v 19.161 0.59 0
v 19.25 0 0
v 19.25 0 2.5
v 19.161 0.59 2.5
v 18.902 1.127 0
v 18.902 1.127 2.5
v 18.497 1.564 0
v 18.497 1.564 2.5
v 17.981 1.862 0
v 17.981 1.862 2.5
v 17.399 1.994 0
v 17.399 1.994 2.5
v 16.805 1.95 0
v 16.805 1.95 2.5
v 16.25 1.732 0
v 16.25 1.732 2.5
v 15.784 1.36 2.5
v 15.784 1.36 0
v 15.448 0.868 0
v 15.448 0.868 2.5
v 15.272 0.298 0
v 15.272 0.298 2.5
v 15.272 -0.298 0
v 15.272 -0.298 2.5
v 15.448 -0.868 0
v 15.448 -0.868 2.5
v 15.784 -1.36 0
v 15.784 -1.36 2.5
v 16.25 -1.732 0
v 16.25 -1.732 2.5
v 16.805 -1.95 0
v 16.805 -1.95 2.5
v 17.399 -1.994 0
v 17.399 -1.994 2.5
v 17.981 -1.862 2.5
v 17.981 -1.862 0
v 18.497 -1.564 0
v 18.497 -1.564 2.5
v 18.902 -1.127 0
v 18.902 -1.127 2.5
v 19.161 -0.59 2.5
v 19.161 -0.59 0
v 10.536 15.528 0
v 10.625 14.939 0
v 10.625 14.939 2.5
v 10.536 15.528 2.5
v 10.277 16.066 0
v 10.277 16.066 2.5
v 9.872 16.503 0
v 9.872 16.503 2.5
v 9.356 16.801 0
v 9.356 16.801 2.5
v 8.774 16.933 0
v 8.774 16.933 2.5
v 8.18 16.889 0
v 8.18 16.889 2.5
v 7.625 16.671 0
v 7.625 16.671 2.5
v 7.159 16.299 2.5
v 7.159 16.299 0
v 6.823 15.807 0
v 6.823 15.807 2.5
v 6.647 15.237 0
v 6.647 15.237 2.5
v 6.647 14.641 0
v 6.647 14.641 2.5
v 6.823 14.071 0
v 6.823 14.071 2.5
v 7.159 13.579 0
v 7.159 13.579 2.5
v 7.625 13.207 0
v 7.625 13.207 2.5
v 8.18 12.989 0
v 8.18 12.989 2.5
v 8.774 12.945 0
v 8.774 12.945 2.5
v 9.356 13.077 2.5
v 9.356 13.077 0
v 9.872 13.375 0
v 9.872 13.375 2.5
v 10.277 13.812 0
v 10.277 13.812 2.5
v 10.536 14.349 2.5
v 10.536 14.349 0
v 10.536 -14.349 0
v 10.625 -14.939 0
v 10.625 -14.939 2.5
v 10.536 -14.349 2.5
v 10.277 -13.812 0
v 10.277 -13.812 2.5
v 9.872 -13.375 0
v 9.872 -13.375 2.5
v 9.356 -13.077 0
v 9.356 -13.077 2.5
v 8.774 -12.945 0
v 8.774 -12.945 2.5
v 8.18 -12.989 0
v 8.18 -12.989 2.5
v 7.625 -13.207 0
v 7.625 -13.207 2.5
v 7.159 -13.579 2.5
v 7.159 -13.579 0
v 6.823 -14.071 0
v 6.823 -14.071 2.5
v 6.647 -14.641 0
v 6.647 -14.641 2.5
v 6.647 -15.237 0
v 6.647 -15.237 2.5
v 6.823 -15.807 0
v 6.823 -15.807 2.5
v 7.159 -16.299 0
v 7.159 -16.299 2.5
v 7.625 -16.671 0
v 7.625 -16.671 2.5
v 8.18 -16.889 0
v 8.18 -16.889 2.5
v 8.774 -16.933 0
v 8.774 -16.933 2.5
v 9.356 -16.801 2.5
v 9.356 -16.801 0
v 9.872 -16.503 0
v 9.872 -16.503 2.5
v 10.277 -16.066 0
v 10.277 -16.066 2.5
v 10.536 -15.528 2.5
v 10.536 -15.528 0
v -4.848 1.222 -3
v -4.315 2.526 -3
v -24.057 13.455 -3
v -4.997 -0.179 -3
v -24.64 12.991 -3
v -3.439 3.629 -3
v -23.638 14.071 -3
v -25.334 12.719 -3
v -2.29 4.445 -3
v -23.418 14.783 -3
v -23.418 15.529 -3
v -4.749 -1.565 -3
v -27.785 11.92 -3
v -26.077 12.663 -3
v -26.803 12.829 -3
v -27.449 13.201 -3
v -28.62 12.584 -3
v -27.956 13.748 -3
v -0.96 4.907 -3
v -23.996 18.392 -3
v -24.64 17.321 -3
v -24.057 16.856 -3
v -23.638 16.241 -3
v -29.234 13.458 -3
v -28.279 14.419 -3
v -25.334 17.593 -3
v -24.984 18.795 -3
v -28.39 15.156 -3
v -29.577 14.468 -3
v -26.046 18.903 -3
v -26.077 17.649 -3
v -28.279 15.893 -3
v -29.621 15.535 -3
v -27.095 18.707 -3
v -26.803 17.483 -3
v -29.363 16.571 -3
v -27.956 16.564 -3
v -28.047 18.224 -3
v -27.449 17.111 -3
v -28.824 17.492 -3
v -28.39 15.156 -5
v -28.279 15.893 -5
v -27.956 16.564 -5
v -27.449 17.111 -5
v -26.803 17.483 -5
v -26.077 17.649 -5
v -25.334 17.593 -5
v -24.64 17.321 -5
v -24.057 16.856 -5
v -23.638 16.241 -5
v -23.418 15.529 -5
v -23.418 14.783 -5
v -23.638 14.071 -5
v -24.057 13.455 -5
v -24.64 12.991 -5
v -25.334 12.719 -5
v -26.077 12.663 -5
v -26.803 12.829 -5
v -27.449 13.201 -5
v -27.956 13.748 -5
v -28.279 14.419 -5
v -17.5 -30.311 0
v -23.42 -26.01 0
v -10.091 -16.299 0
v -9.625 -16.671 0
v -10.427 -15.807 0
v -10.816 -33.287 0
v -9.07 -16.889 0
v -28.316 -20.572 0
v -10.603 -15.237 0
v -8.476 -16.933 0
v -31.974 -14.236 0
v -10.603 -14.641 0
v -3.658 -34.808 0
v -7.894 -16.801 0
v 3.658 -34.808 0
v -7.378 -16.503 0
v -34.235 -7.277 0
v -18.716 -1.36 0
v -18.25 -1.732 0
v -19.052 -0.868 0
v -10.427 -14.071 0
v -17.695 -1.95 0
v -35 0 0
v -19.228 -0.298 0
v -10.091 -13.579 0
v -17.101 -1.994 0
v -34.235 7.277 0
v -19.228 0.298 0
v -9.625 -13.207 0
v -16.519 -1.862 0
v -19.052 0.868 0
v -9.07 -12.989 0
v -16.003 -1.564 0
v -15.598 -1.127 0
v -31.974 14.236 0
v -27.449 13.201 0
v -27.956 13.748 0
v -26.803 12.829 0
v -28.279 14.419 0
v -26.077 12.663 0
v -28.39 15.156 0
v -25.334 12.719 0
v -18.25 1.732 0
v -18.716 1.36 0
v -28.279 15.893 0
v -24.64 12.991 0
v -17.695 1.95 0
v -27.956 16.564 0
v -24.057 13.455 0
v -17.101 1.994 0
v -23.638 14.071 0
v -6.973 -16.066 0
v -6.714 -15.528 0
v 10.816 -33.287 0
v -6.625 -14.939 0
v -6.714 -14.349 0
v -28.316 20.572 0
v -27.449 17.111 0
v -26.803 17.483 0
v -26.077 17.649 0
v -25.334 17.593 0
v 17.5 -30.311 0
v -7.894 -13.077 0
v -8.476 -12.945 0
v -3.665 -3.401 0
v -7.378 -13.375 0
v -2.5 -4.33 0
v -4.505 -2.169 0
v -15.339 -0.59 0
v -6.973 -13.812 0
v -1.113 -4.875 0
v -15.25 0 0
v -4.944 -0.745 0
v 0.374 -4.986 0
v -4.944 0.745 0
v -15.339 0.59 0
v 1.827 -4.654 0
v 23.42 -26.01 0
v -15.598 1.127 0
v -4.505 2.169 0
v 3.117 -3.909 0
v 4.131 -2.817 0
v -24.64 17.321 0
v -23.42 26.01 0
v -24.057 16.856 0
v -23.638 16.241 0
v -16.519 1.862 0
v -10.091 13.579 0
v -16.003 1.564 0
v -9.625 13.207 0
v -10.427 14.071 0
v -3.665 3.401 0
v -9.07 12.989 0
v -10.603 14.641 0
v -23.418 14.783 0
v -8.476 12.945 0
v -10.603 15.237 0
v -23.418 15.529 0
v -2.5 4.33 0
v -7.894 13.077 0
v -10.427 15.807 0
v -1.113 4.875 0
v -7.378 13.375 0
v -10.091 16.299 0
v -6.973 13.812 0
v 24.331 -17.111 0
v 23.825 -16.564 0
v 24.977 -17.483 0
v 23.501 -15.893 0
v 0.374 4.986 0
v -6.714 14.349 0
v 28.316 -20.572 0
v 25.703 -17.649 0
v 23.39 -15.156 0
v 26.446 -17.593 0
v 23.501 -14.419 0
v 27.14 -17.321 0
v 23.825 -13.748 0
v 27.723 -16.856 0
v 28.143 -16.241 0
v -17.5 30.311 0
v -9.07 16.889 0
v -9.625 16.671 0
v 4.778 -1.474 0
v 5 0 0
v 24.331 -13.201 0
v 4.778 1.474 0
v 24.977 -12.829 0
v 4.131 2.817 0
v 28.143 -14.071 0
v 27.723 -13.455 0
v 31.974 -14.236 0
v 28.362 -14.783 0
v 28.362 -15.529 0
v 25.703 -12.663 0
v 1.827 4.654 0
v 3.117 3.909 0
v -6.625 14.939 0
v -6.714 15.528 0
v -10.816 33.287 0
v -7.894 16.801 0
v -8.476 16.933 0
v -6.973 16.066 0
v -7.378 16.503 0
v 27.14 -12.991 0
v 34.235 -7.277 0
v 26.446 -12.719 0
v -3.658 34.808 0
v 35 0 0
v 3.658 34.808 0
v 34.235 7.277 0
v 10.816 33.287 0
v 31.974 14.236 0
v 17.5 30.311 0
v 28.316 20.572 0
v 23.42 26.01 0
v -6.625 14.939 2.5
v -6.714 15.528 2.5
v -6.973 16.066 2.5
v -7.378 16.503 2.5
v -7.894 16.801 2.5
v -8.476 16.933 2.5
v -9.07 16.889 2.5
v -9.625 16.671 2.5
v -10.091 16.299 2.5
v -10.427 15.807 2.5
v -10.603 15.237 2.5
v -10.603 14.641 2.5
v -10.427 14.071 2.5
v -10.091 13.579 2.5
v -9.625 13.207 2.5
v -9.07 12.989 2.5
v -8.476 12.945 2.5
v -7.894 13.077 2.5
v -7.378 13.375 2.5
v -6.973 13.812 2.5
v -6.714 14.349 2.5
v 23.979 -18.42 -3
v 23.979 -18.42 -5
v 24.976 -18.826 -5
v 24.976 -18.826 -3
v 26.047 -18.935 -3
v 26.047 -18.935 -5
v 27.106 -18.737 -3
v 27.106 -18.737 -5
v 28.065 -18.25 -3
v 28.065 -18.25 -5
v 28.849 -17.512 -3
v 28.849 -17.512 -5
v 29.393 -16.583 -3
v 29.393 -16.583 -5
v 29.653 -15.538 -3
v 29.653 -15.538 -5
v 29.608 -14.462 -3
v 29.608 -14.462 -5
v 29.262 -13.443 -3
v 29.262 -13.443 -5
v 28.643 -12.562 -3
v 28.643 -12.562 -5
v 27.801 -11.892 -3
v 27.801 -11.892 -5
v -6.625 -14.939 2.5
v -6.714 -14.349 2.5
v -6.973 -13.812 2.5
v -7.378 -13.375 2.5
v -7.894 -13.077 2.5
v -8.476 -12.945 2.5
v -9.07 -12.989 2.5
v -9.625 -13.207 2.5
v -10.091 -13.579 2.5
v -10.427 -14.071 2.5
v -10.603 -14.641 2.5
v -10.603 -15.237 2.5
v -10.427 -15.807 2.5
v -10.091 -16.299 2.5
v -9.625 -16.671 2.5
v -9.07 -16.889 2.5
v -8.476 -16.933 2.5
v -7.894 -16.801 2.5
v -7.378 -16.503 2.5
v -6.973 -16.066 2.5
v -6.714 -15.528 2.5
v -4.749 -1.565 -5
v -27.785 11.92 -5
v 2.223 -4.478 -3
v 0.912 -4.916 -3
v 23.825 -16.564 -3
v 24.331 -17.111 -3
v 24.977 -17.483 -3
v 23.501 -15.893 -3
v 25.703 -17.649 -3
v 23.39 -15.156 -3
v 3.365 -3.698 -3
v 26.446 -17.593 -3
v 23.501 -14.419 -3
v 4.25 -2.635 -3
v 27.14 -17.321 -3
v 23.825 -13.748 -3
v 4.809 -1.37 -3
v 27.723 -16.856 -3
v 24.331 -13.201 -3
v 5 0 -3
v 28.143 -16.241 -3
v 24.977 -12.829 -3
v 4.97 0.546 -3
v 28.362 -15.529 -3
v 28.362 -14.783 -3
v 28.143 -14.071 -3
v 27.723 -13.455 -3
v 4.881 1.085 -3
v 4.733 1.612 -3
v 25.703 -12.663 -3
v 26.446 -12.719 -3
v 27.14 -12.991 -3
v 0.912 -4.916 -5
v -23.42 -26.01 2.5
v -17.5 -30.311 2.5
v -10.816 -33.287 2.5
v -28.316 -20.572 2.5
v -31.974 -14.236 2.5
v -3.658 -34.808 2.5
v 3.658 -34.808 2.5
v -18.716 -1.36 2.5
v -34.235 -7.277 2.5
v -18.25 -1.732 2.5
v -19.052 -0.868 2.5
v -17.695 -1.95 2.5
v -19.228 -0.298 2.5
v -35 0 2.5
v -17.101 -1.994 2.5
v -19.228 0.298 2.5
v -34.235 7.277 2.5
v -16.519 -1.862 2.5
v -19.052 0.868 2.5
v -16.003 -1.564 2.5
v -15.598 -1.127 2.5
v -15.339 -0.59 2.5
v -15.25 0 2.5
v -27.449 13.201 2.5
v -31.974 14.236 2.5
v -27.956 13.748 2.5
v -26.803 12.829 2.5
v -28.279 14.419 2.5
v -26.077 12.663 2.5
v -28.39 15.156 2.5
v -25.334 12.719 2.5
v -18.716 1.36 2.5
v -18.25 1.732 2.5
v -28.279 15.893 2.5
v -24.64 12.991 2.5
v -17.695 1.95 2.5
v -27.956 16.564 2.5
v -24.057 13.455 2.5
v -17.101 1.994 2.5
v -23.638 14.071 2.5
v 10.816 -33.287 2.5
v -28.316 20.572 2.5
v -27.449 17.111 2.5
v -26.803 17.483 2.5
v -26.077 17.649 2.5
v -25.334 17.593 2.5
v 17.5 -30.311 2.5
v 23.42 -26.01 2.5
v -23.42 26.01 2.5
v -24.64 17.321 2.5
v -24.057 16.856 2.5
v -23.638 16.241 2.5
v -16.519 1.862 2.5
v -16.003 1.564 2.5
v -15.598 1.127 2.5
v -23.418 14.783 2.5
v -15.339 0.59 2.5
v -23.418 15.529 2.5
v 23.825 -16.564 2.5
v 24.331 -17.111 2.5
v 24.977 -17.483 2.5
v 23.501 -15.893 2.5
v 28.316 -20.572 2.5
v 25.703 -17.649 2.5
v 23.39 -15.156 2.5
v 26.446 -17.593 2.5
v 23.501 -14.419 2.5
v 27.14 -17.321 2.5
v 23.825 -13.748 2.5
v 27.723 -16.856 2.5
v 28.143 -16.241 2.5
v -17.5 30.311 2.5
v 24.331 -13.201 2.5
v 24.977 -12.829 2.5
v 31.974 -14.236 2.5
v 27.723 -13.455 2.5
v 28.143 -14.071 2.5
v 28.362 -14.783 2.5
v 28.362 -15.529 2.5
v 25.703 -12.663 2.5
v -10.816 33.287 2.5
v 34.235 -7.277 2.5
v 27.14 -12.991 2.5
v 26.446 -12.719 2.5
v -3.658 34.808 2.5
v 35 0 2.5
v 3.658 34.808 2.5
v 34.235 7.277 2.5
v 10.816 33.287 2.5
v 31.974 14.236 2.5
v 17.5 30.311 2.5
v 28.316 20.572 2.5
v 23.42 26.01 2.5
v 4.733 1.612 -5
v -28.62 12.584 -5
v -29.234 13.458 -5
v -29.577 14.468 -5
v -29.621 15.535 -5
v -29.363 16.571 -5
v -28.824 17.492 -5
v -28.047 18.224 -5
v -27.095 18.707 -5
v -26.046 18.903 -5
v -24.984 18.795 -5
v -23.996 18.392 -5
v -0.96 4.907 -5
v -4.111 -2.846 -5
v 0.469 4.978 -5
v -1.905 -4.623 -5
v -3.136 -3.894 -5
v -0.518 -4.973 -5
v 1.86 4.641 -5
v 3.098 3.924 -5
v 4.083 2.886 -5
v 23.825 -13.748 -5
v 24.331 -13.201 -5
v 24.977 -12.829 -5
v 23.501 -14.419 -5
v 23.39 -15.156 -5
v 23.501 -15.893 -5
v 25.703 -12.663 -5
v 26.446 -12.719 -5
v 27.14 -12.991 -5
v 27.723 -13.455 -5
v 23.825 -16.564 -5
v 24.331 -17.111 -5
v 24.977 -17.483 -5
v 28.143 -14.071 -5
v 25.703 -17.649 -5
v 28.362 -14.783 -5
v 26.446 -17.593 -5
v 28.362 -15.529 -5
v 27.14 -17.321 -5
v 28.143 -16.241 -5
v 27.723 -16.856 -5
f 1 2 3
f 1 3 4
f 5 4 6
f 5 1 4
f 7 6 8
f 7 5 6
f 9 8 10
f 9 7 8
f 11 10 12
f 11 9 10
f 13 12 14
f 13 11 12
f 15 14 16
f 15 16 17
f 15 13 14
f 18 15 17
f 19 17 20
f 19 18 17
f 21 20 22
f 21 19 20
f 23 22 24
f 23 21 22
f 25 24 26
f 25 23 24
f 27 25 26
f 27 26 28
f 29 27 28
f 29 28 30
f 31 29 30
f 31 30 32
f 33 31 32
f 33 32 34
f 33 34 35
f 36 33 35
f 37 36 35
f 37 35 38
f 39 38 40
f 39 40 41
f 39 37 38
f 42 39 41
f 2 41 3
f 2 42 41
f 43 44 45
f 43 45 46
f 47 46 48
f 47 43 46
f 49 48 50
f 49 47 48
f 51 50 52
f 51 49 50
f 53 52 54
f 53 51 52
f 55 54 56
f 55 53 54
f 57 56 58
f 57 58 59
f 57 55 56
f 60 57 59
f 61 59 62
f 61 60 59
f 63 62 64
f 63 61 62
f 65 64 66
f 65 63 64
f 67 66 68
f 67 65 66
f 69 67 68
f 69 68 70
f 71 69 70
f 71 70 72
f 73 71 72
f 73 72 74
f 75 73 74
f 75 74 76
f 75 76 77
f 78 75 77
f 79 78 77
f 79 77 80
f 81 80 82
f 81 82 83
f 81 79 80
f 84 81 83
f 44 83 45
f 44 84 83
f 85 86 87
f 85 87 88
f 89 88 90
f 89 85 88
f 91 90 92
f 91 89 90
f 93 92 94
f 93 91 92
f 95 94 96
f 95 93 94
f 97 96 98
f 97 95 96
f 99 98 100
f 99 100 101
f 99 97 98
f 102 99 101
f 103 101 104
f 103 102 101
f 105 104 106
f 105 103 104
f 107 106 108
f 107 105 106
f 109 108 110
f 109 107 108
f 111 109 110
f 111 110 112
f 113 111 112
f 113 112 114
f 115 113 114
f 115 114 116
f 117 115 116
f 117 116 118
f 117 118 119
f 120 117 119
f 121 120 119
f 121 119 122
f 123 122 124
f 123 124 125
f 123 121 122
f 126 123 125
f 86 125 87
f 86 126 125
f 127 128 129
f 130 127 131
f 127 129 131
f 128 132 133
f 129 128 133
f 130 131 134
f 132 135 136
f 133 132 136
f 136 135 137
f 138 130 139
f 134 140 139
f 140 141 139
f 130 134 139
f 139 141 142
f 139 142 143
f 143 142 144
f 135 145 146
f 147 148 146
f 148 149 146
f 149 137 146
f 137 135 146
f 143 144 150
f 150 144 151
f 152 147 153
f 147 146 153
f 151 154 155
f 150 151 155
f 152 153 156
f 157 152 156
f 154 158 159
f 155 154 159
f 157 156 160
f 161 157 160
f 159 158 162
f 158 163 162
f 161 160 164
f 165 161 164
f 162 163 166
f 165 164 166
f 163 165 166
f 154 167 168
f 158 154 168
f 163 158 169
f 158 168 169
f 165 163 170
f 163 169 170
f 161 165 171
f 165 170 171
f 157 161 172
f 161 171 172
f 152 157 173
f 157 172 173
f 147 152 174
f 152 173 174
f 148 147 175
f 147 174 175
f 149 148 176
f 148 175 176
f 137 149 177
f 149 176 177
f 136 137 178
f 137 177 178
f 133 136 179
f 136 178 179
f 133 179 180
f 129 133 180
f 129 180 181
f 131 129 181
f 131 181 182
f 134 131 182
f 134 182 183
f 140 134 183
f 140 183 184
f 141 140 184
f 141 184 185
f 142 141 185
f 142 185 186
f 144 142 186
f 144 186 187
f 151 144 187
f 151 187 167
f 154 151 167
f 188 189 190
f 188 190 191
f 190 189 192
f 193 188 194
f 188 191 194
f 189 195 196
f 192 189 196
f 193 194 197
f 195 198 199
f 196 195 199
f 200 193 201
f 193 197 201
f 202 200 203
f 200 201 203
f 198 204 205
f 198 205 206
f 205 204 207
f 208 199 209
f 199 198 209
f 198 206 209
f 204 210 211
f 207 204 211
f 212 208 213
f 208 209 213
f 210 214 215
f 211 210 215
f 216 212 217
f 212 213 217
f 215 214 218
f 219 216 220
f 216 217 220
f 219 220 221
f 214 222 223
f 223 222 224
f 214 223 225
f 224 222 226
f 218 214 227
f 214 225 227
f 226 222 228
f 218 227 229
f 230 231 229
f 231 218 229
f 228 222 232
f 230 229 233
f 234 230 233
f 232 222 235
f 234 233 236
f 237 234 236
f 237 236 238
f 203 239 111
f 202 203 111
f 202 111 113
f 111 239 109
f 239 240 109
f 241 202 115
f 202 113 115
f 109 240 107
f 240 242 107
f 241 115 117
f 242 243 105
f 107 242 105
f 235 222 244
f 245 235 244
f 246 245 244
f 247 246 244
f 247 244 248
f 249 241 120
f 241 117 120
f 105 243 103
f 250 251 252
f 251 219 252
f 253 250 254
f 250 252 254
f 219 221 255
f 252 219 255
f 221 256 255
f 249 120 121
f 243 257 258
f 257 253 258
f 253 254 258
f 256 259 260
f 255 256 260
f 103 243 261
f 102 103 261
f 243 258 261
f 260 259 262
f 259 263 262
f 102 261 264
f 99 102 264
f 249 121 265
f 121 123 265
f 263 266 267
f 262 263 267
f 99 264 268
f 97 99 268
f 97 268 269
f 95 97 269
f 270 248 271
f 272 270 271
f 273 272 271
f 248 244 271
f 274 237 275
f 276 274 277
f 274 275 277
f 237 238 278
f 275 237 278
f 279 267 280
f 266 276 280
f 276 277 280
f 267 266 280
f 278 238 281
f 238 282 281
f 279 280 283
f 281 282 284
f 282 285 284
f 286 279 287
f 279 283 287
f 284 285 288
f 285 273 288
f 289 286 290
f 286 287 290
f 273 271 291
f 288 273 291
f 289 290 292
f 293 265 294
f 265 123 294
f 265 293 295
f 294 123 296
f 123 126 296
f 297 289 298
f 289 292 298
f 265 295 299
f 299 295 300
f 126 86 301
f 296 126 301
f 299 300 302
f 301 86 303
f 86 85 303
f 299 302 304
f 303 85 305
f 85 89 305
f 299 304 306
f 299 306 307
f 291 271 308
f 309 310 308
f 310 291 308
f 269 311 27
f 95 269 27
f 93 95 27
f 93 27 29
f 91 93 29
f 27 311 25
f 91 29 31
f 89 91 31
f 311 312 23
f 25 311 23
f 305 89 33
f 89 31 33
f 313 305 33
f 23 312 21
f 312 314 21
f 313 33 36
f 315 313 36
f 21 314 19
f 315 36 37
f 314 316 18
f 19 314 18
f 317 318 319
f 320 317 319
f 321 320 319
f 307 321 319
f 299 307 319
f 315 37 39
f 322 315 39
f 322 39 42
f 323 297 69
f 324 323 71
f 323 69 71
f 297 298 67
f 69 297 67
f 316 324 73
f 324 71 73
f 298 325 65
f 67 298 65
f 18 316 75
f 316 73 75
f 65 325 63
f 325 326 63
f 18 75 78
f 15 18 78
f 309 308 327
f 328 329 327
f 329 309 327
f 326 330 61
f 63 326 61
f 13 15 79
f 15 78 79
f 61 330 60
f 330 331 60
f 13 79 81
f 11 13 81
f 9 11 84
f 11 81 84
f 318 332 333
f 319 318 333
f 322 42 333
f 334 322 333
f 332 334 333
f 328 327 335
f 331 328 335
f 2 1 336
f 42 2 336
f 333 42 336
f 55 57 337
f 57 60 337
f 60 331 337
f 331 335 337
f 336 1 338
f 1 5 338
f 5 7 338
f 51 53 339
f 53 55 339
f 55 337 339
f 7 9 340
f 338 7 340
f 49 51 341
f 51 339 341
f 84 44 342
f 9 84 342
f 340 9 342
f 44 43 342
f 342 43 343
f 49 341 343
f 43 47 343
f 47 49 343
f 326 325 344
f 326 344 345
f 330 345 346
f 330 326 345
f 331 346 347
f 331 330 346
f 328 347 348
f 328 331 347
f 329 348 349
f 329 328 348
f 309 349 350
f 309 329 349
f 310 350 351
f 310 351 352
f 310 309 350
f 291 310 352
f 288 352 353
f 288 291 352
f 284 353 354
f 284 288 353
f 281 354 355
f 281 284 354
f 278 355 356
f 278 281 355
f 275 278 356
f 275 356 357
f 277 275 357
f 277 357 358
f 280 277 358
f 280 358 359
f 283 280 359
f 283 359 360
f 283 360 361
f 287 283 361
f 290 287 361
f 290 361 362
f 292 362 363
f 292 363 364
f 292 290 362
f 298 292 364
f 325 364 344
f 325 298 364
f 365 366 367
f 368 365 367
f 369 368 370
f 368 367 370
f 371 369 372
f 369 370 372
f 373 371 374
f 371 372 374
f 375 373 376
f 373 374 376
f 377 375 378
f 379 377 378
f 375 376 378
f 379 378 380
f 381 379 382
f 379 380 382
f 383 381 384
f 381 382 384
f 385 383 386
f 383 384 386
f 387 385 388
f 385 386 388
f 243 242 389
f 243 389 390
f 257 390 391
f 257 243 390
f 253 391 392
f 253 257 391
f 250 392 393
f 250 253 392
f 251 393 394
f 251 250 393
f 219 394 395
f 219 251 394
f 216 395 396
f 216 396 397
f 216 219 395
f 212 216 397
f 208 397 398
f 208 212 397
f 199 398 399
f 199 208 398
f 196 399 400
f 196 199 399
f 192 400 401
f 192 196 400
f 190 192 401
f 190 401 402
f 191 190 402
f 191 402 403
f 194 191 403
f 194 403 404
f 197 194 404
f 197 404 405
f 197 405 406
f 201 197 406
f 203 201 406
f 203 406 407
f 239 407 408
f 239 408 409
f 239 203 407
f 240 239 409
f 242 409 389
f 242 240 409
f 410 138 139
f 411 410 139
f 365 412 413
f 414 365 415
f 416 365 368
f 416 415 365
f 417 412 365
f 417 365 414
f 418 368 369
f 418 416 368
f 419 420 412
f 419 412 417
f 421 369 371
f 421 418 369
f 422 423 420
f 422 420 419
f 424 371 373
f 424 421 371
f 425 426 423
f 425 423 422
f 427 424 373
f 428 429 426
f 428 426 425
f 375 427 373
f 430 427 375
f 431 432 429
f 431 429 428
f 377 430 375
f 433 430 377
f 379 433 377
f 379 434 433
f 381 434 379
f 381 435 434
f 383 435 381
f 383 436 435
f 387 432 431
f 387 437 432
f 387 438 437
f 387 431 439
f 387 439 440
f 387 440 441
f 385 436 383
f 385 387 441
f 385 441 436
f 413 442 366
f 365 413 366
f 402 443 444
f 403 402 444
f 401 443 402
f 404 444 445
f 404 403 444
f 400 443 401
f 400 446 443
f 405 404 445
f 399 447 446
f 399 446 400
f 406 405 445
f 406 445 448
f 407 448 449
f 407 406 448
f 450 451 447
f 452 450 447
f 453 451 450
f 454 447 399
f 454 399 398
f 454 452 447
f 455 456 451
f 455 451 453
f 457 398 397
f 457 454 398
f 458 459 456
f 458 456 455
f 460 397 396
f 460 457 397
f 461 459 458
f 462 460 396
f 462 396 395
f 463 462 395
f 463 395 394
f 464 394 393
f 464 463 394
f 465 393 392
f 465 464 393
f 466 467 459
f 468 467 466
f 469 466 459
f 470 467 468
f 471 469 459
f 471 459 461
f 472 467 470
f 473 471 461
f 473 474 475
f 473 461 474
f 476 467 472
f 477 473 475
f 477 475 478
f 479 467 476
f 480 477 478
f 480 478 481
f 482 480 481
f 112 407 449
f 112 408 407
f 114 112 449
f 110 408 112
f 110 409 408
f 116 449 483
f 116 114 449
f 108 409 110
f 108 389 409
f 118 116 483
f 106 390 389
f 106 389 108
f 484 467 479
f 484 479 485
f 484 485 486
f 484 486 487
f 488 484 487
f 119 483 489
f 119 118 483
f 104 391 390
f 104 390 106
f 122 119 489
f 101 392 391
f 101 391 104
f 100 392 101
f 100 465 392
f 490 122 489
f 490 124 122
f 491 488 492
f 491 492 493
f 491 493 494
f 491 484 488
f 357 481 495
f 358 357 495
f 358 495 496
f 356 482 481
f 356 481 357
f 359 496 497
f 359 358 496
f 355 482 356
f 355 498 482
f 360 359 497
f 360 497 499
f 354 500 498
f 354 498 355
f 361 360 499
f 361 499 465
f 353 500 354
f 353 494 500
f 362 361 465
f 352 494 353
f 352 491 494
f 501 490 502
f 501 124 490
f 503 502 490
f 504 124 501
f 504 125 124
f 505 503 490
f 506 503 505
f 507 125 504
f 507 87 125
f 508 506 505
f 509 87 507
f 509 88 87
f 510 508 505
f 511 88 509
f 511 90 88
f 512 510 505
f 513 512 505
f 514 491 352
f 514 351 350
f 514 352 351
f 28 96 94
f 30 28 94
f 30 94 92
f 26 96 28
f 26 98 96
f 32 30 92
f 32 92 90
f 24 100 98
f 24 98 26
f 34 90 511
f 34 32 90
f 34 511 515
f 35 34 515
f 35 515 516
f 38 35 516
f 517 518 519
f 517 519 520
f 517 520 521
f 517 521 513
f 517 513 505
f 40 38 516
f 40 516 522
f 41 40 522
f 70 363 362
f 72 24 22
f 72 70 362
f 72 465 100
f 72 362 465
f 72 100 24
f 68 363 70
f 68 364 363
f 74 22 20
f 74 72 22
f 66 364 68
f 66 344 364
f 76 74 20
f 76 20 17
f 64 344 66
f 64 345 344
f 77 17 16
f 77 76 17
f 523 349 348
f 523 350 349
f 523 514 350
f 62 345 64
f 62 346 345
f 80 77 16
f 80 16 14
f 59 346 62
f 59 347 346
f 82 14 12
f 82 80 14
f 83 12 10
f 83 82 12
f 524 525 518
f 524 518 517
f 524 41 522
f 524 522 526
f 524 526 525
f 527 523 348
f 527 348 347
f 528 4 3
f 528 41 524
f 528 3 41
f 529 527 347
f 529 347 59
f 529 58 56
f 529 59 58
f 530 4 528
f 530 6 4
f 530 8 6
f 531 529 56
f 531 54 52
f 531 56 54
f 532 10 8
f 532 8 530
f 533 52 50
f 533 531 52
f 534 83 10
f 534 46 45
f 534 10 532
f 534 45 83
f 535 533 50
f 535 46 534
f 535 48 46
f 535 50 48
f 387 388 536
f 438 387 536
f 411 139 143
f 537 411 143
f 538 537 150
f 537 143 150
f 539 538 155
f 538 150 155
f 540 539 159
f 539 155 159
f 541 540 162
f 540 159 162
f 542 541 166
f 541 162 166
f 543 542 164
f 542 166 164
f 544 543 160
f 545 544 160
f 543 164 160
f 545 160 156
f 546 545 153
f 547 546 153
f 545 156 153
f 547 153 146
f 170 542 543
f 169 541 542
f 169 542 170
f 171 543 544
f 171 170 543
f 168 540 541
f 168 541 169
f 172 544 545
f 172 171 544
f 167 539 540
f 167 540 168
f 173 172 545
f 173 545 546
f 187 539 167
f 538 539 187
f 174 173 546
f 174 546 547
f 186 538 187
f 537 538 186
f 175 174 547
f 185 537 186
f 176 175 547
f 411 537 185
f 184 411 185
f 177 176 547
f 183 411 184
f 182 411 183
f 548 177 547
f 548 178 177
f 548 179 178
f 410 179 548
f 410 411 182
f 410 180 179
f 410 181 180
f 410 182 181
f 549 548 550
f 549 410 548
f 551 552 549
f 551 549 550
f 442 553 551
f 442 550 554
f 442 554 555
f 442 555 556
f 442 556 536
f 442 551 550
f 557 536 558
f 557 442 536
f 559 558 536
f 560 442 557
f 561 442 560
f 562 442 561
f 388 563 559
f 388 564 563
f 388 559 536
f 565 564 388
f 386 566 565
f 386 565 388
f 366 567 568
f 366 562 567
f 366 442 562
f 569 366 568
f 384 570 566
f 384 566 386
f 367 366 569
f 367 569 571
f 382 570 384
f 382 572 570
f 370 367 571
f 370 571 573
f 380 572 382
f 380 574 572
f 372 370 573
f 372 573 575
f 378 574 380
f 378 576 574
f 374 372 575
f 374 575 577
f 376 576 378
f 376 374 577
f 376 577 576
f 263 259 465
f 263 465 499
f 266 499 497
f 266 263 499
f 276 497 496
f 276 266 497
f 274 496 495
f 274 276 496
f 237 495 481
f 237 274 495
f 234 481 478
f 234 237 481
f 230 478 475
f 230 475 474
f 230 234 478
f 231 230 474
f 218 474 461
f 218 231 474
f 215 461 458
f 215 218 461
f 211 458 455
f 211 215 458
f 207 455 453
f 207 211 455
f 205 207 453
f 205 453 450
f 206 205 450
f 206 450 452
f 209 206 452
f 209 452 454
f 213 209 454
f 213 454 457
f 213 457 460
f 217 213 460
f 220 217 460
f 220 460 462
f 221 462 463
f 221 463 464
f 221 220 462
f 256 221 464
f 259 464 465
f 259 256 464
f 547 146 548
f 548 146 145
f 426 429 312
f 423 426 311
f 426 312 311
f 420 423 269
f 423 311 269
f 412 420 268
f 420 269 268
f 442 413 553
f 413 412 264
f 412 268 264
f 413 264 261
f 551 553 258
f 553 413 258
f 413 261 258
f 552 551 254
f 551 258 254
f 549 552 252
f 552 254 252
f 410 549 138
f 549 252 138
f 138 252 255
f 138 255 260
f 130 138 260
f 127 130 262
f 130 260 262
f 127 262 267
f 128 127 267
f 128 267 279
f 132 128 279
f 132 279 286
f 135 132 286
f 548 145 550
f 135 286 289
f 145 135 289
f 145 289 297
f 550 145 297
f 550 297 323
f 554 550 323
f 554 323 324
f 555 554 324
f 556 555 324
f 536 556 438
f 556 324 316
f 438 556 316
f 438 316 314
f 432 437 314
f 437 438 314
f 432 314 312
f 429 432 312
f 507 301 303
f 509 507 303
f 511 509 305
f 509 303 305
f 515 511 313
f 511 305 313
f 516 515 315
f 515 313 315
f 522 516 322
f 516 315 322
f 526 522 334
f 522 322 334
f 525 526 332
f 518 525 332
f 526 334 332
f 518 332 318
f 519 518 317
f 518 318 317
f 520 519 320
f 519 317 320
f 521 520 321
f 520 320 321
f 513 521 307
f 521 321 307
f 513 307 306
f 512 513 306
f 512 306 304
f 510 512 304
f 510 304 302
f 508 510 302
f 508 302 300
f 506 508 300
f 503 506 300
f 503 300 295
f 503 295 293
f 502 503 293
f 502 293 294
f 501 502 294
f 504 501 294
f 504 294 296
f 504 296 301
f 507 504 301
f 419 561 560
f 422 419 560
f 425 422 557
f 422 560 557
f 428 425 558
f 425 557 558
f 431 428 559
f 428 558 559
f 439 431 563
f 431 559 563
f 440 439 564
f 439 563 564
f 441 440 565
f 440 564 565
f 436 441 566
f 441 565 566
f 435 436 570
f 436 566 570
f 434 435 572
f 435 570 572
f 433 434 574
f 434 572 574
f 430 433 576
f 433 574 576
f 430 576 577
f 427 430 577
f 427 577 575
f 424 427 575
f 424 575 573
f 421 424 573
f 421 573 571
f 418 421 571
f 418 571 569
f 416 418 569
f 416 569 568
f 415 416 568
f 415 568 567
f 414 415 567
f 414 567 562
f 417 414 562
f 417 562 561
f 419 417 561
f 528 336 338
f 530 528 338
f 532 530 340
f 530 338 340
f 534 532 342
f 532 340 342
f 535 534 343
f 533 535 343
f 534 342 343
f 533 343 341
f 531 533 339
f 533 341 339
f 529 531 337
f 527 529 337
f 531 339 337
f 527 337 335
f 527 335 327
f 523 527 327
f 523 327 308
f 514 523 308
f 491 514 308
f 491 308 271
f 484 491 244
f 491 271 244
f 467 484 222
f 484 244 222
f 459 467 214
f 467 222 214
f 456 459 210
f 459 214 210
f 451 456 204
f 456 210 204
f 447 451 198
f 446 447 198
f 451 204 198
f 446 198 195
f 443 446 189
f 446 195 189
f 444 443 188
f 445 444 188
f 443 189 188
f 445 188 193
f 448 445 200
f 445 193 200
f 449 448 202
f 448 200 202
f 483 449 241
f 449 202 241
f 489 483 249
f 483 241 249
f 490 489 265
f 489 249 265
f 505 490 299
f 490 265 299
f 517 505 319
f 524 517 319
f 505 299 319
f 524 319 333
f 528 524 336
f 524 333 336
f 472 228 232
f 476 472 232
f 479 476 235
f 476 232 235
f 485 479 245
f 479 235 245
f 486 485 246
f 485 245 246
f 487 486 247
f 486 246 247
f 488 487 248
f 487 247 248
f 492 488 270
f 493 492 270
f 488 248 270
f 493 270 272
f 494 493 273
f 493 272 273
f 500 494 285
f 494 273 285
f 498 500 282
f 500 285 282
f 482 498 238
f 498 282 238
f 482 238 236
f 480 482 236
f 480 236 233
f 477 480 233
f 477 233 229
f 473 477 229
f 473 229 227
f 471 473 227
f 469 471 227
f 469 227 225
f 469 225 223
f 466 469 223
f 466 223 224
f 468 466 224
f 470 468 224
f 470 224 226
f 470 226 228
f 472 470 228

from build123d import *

# Parameters (mm, degrees)
SKETCH_1_R          = 35
SKETCH_1_R_2        = 2
EXTRUDE_1_DEPTH     = 2.5
SKETCH_2_R          = 5
EXTRUDE_2_DEPTH     = 5
EXTRUDE_3_DEPTH     = 2
EXTRUDE_START       = -2
EXTRUDE_4_DEPTH     = 2
SKETCH_6_R          = 2.5
CUT_EXTRUDE_1_DEPTH = 51.062460986


with BuildPart() as part:
    # 草图1 → 凸台-拉伸1 (new body)
    with BuildSketch(Plane.XY):
        Circle(SKETCH_1_R)
        with Locations((17.25, 0)):
            Circle(SKETCH_1_R_2, mode=Mode.SUBTRACT)
        with Locations((8.625, -14.938938215)):
            Circle(SKETCH_1_R_2, mode=Mode.SUBTRACT)
        with Locations((-8.625, -14.938938215)):
            Circle(SKETCH_1_R_2, mode=Mode.SUBTRACT)
        with Locations((-17.25, 0)):
            Circle(SKETCH_1_R_2, mode=Mode.SUBTRACT)
        with Locations((-8.625, 14.938938215)):
            Circle(SKETCH_1_R_2, mode=Mode.SUBTRACT)
        with Locations((8.625, 14.938938215)):
            Circle(SKETCH_1_R_2, mode=Mode.SUBTRACT)
    extrude(amount=EXTRUDE_1_DEPTH)

    # 草图2 → 凸台-拉伸2 (add)
    with BuildSketch(Plane(origin=(0, 0, 0), x_dir=(-1, 0, 0), z_dir=(0, 0, -1))):
        with Locations(Location((0, 0, 0), (0, 0, 180))):
            Circle(SKETCH_2_R)
    extrude(amount=EXTRUDE_2_DEPTH)

    # 草图3 → 凸台-拉伸3 (add)
    with BuildSketch(Plane(origin=(0, 0, -5), x_dir=(-1, 0, 0), z_dir=(0, 0, -1))):
        with BuildLine():
            Line((1.910748146, -3.264034868), (-23.979362284, -18.419963804))
            ThreePointArc((-23.979362284, -18.419963804), (-29.154145298, -17.066677082), (-27.800858576, -11.891894068))
            Line((-27.800858576, -11.891894068), (-1.910748146, 3.264034868))
            ThreePointArc((-1.910748146, 3.264034868), (3.264034868, 1.910748146), (1.910748146, -3.264034868))
        make_face()
    extrude(amount=-EXTRUDE_3_DEPTH)

    # 草图5 → 凸台-拉伸4 (add)
    with BuildSketch(Plane(origin=(0, 0, -5), x_dir=(-1, 0, 0), z_dir=(0, 0, -1)).offset(EXTRUDE_START)):
        with BuildLine():
            Line((23.995619313, 18.39219274), (0.959625284, 4.907047923))
            ThreePointArc((0.959625284, 4.907047923), (4.315018405, 2.525988156), (4.748607518, -1.565479685))
            Line((4.748607518, -1.565479685), (27.784601547, 11.919665132))
            ThreePointArc((27.784601547, 11.919665132), (29.126374234, 17.050420053), (23.995619313, 18.39219274))
        make_face()
    extrude(amount=EXTRUDE_4_DEPTH)

    # 草图6 → 切除-拉伸1 (cut, through all)
    with BuildSketch(Plane(origin=(0, 0, -5), x_dir=(-1, 0, 0), z_dir=(0, 0, -1))):
        with Locations((-25.89011043, -15.155928936)):
            Circle(SKETCH_6_R)
        with Locations((25.89011043, 15.155928936)):
            Circle(SKETCH_6_R)
    extrude(amount=-CUT_EXTRUDE_1_DEPTH, mode=Mode.SUBTRACT)


solid = part.part
